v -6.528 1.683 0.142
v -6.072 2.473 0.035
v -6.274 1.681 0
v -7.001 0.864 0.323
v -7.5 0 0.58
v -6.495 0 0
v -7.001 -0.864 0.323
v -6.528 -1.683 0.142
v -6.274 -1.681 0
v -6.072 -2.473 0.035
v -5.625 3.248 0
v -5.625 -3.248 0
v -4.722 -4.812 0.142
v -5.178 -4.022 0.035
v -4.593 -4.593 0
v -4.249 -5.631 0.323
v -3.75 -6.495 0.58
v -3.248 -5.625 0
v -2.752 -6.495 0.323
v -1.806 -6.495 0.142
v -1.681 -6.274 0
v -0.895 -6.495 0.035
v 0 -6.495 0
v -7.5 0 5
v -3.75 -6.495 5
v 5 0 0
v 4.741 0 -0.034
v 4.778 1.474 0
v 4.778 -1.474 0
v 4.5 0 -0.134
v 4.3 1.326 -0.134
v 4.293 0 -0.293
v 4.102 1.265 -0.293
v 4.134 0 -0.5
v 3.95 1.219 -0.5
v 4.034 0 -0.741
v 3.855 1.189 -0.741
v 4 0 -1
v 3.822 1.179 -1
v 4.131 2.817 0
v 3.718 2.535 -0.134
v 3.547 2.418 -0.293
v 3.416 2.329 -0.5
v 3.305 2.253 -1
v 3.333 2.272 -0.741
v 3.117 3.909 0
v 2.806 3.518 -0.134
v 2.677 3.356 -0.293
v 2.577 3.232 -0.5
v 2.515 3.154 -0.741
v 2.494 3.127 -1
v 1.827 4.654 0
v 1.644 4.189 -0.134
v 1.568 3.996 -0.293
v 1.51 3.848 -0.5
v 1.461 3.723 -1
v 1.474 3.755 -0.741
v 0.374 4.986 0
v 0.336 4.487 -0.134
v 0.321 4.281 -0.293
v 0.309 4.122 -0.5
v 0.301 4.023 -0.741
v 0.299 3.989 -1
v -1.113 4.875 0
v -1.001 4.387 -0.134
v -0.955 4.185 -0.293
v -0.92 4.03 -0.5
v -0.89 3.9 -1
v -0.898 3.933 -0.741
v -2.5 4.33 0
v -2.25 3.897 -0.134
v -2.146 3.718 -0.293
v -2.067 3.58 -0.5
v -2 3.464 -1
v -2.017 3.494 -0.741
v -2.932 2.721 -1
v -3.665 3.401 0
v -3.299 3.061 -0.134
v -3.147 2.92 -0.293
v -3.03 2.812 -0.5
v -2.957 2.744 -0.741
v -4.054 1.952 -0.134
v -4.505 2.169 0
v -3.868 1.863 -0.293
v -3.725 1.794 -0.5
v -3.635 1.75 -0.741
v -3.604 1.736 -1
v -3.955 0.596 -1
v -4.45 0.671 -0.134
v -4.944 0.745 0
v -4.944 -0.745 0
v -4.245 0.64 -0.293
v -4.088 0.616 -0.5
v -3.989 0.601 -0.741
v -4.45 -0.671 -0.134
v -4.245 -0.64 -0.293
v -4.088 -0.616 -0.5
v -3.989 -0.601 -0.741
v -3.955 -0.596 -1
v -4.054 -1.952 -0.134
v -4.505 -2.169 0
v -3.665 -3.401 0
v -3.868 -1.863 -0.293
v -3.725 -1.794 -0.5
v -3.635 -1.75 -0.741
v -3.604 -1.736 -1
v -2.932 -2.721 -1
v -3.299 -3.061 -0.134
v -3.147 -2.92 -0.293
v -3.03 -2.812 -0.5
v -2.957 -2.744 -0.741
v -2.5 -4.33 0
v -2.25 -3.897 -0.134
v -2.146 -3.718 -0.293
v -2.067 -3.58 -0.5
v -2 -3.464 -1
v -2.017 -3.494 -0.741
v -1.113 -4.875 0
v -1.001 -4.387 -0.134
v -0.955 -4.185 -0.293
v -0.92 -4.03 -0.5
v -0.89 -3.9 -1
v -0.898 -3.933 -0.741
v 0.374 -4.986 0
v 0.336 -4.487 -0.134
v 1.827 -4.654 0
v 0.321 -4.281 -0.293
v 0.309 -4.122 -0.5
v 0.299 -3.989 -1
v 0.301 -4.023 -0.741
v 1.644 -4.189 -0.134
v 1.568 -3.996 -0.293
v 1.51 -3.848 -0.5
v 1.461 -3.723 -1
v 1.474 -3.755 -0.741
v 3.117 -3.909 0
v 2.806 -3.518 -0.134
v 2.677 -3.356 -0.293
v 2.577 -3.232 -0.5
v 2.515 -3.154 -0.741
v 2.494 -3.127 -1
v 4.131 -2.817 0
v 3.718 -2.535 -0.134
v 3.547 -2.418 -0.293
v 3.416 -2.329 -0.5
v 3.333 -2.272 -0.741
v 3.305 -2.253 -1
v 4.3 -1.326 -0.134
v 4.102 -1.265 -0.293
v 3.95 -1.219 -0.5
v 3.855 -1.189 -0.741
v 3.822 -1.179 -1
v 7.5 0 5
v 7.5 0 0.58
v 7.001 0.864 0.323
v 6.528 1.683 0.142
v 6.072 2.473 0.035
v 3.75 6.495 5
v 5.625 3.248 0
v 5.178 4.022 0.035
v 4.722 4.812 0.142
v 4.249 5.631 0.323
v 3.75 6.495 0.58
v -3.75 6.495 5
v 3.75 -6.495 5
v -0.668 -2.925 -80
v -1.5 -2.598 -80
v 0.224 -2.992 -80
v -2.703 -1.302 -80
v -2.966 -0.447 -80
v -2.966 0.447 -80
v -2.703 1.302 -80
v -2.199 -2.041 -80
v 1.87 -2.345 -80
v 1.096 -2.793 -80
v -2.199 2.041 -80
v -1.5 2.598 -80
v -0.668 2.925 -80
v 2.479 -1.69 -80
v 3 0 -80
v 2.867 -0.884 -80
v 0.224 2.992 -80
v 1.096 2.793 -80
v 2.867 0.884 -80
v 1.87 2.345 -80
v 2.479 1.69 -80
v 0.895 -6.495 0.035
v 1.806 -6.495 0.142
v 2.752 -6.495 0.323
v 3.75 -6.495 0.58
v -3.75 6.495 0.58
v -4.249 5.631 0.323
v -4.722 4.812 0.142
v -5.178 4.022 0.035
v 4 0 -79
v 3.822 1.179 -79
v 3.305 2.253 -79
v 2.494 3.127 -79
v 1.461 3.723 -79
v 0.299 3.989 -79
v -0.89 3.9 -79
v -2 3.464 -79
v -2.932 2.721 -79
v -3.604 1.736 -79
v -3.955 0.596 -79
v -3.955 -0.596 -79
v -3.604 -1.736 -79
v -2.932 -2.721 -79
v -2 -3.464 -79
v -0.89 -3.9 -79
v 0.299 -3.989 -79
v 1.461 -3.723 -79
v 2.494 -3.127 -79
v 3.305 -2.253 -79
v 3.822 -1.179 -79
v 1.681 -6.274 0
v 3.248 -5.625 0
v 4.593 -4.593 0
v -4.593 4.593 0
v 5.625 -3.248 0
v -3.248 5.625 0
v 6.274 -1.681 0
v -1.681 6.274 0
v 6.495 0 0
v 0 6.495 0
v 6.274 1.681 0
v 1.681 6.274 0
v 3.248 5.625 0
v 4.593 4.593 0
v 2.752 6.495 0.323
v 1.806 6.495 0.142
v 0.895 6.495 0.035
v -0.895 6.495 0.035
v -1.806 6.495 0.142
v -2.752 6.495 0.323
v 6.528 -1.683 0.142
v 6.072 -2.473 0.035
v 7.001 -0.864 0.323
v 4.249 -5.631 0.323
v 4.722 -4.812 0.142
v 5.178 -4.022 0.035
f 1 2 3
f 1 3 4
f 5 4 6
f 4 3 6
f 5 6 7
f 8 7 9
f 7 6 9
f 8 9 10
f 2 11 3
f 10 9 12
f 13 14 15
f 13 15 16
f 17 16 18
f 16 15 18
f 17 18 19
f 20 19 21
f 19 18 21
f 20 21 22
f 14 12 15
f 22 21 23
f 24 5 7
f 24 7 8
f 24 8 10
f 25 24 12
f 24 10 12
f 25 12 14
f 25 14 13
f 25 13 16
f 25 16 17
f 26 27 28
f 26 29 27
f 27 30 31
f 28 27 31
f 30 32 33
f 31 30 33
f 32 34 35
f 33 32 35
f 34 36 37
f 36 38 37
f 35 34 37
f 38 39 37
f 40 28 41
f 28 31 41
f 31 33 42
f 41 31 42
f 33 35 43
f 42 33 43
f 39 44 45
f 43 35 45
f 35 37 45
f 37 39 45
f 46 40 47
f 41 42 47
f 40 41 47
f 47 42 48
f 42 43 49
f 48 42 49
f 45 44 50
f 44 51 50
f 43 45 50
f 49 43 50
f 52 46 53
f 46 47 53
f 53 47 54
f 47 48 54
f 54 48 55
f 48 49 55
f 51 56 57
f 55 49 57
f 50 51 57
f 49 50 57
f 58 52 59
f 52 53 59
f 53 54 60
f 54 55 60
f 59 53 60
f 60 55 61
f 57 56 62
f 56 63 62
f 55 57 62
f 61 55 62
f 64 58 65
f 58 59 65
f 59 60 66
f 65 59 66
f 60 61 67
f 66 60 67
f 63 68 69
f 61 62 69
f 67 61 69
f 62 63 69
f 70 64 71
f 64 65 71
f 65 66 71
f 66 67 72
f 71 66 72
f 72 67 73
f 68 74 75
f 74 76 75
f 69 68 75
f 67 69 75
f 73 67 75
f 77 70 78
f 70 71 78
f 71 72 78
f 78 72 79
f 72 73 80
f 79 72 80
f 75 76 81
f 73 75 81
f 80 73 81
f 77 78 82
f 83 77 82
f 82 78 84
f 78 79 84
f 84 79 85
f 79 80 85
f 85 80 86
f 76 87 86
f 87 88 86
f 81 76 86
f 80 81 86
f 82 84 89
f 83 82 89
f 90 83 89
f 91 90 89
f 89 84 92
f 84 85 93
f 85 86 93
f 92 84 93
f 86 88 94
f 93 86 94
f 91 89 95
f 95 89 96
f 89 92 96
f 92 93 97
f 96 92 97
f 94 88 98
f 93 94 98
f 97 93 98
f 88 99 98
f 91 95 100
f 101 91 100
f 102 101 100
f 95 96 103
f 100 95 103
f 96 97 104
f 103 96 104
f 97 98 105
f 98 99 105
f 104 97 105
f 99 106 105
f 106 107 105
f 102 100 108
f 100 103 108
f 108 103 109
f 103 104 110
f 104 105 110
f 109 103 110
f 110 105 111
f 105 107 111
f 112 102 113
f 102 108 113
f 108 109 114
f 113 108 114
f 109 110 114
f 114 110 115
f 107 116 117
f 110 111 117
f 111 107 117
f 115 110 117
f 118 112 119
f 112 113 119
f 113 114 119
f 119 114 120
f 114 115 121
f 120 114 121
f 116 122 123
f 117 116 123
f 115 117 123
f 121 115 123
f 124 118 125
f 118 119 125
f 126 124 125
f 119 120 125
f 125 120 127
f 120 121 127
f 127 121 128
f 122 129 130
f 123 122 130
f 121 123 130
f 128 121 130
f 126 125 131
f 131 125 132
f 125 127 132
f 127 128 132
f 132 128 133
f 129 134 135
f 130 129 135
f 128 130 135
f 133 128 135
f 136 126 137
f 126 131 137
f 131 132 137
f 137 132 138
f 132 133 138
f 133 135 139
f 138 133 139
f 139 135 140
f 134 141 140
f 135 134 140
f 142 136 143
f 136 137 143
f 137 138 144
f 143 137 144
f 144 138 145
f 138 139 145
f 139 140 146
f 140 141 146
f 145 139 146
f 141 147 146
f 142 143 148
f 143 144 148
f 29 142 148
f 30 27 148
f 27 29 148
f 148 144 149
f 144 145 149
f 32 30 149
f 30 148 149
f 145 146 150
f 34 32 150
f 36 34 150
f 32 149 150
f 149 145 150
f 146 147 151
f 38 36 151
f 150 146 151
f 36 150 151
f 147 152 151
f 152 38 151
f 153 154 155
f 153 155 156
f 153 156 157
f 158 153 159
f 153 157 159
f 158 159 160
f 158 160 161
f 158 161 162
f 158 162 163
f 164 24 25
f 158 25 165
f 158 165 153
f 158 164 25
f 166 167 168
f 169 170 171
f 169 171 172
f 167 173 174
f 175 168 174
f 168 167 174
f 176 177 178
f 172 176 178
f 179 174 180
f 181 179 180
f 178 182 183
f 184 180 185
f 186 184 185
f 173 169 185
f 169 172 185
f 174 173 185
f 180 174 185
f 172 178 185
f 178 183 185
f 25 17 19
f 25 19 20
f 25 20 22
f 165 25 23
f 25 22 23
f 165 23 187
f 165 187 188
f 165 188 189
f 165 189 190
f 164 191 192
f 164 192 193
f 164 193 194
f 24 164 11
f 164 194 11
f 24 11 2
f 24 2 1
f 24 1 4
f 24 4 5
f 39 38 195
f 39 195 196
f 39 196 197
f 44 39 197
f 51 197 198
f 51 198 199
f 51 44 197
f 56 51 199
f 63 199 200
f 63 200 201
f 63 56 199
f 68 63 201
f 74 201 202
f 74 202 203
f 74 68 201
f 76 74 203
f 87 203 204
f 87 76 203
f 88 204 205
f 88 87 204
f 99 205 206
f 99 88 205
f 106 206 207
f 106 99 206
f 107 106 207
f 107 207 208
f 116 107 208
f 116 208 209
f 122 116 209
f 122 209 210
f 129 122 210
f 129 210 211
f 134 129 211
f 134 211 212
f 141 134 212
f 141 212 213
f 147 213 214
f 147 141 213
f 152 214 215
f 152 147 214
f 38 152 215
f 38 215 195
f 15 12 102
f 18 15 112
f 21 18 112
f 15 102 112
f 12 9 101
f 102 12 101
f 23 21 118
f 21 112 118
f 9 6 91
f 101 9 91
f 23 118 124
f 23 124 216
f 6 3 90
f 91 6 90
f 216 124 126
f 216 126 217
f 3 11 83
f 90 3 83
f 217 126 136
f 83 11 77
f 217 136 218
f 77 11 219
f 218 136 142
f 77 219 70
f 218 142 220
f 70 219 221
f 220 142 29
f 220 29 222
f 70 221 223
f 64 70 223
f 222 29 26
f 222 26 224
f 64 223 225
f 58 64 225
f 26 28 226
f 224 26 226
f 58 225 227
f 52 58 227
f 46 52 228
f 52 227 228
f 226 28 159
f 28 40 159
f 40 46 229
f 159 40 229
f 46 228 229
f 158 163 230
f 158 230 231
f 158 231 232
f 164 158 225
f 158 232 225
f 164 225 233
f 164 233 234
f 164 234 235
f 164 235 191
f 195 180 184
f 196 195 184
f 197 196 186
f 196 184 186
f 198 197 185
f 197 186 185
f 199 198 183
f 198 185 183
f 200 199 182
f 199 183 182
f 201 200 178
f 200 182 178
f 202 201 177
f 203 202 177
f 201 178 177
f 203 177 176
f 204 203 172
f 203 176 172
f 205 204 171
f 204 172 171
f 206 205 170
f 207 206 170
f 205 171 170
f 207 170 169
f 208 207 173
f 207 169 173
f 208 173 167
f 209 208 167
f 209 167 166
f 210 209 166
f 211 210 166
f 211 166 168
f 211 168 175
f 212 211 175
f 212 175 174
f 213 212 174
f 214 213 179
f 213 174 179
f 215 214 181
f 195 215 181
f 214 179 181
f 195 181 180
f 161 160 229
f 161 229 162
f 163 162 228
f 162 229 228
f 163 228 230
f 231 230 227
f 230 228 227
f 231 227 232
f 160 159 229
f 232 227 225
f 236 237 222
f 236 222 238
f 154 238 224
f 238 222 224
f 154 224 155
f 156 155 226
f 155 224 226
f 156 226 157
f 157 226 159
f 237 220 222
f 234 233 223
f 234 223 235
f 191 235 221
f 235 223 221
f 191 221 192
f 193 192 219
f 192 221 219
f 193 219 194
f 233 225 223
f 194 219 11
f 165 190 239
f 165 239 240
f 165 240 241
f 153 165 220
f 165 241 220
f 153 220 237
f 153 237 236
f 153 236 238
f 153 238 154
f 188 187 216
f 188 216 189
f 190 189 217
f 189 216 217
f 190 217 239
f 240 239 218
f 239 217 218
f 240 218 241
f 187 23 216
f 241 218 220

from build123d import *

# Parameters (mm, degrees)
DODANIE_WYCI_GNI_CIE2_DEPTH = 5
SZKIC3_OUTSIDE_W            = 55.734
SZKIC3_OUTSIDE_H            = 53.724
SZKIC3_OUTSIDE_R            = 6.495190528
WYTNIJ_WYCI_GNI_CIE2_DEPTH  = 10
WYTNIJ_WYCI_GNI_CIE2_DRAFT  = 60
SZKIC4_R                    = 4
DODANIE_WYCI_GNI_CIE3_DEPTH = 80
ZAOKR_GLENIE1_R             = 1
SFAZOWANIE1_SIZE            = 1


with BuildPart() as part:
    # Szkic1 → Dodanie-wyciągnięcie2 (new body)
    with BuildSketch(Plane.XY):
        Polygon((3.75, 6.495190528), (-3.75, 6.495190528), (-7.5, 0), (-3.75, -6.495190528), (3.75, -6.495190528), (7.5, 0), align=None)
    extrude(amount=DODANIE_WYCI_GNI_CIE2_DEPTH)


with BuildPart() as wytnij_wyci_gni_cie2_tool:
    # Szkic3 outside → Wytnij-wyciągnięcie2 (with draft: the straight prism first)
    with BuildSketch(Plane.XY):
        Rectangle(SZKIC3_OUTSIDE_W, SZKIC3_OUTSIDE_H)
        Circle(SZKIC3_OUTSIDE_R, mode=Mode.SUBTRACT)
    extrude(amount=WYTNIJ_WYCI_GNI_CIE2_DEPTH)
    # Wytnij-wyciągnięcie2: the draft: its side faces are tilted about the plane it starts from
    wytnij_wyci_gni_cie2_sides = [wytnij_wyci_gni_cie2_tool.faces().sort_by_distance(p)[0] for p in [
        (0, -26.862, 5),
        (27.867, 0, 5),
        (0, 26.862, 5),
        (-27.867, 0, 5),
        (-6.495190528, 0, 5),
    ]]
    draft(wytnij_wyci_gni_cie2_sides, Plane.XY, WYTNIJ_WYCI_GNI_CIE2_DRAFT)


with BuildPart() as part_1:
    add(part.part)

    # Wytnij-wyciągnięcie2: cut by wytnij_wyci_gni_cie2_tool
    add(wytnij_wyci_gni_cie2_tool.part, mode=Mode.SUBTRACT)

    # Szkic4 → Dodanie-wyciągnięcie3 (add)
    with BuildSketch(Plane.XY):
        Circle(SZKIC4_R)
    extrude(amount=-DODANIE_WYCI_GNI_CIE3_DEPTH)

    # Zaokrąglenie1
    zaokr_glenie1_edges = [part_1.edges().sort_by_distance(p)[0] for p in [
        (-4, 0, 0),
    ]]
    fillet(zaokr_glenie1_edges, radius=ZAOKR_GLENIE1_R)

    # Sfazowanie1
    sfazowanie1_edges = [part_1.edges().sort_by_distance(p)[0] for p in [
        (-4, 0, -80),
    ]]
    chamfer(sfazowanie1_edges, length=SFAZOWANIE1_SIZE)


solid = part_1.part
